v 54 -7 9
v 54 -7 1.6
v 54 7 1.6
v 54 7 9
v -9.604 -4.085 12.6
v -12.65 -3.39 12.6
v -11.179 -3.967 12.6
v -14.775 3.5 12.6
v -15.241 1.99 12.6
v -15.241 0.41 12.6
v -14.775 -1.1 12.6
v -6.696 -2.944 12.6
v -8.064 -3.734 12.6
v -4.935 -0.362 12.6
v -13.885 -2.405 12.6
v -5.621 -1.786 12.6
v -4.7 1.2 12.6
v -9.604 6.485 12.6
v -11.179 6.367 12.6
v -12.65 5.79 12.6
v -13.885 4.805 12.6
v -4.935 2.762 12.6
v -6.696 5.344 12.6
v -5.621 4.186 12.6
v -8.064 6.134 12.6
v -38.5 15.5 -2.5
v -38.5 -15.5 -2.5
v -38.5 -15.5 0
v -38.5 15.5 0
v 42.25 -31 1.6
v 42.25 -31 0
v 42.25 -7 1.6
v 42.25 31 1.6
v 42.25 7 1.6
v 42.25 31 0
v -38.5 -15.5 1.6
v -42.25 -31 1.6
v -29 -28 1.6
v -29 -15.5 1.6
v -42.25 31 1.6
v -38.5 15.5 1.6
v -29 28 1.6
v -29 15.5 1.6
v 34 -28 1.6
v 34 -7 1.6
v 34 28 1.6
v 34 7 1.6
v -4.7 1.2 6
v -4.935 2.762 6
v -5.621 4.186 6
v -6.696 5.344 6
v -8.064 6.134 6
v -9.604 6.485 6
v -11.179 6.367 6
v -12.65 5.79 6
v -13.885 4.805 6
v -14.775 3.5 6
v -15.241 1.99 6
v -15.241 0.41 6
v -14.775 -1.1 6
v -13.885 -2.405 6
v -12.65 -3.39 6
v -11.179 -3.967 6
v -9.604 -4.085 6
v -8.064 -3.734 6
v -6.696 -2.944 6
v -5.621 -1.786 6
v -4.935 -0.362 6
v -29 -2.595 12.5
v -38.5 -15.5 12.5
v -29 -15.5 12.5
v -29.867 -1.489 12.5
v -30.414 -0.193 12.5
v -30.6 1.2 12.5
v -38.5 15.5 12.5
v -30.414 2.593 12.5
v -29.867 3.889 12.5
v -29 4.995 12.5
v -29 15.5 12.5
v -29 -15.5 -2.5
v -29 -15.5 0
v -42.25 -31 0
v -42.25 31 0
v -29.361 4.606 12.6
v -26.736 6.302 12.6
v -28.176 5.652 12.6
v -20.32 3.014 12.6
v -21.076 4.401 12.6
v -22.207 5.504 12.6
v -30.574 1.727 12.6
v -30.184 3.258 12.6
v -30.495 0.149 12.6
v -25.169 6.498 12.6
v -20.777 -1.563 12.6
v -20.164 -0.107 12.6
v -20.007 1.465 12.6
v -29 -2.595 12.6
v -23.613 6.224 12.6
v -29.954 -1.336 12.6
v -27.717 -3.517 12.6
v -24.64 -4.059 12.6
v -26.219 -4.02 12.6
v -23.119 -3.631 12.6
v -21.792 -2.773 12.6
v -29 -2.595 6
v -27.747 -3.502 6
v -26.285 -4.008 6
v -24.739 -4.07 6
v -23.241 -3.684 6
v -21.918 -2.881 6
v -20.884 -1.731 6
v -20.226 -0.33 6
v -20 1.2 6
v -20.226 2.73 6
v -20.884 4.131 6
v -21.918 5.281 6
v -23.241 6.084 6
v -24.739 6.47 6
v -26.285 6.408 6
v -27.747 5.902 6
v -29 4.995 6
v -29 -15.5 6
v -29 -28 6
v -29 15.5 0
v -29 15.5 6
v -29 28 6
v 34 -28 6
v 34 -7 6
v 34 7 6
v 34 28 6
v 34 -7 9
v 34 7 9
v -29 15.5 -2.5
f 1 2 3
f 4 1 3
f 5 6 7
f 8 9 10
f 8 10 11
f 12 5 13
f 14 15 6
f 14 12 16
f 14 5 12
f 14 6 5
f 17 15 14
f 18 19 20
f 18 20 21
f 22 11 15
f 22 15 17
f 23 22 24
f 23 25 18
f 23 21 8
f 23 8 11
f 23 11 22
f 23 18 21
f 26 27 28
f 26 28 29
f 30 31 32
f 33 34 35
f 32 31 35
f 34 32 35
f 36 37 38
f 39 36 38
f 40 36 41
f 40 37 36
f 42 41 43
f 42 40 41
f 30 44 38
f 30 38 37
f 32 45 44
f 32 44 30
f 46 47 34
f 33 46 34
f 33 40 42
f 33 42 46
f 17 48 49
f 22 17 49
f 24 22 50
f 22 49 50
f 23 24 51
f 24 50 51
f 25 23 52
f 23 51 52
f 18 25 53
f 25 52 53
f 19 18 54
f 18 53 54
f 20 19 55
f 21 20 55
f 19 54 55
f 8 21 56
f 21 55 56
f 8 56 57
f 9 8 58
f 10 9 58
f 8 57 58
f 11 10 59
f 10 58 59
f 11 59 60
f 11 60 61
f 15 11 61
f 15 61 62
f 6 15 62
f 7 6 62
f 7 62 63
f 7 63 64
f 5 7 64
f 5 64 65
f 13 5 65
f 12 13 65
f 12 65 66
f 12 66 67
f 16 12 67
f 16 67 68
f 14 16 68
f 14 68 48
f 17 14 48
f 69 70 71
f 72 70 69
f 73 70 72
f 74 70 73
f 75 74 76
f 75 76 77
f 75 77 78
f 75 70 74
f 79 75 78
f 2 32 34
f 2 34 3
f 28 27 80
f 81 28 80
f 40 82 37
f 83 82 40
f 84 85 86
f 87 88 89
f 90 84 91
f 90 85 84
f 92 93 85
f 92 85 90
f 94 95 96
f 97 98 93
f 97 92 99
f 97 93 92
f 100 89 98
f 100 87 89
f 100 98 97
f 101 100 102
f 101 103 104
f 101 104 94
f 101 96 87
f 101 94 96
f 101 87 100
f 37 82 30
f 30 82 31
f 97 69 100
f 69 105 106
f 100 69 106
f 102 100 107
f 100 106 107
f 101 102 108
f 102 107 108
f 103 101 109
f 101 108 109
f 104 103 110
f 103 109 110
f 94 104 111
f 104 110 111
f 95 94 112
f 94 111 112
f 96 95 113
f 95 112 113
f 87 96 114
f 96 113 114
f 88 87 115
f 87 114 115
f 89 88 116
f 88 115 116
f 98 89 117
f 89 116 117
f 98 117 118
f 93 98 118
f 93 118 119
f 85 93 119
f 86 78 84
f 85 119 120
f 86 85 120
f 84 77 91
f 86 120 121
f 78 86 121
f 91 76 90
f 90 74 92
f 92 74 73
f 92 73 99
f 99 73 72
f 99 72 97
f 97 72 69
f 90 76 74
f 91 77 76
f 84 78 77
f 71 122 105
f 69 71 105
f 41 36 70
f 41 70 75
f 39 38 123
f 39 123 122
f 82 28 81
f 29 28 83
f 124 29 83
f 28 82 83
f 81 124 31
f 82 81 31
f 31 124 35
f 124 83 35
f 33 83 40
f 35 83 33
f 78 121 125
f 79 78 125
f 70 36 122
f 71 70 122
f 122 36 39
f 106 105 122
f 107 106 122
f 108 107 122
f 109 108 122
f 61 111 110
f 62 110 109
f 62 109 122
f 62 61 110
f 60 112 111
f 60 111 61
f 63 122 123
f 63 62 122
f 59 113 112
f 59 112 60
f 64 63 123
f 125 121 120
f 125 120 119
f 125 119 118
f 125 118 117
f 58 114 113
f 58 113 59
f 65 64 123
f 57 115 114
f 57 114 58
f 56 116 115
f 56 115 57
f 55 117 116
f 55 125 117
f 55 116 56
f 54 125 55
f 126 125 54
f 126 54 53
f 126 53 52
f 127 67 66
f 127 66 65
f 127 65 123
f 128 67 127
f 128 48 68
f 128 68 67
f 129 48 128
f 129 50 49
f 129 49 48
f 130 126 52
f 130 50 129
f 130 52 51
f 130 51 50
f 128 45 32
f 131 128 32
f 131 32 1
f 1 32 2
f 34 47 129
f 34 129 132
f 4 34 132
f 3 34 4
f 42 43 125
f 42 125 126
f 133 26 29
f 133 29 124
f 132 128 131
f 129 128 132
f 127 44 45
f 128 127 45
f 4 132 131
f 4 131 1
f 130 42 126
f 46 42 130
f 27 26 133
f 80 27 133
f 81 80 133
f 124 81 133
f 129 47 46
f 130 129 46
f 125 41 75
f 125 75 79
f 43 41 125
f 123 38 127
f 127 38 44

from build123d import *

# Parameters (mm, degrees)
SKETCH1_W             = 84.5
SKETCH1_H             = 62
PCB_DEPTH             = 1.6
SKETCH2_W             = 9.5
SKETCH2_H             = 31
TERMINAL_BLOCK_DEPTH  = 10.9
SKETCH3_W             = 9.5
SKETCH3_H             = 31
TERMINAL_PINS_DEPTH   = 2.5
SKETCH4_W             = 63
SKETCH4_H             = 56
COMPONENTS_DEPTH      = 4.4
SKETCH5_W             = 20
SKETCH5_H             = 14
INPUT_CONNECTOR_DEPTH = 7.4
SKETCH6_R             = 5.3
CAP_1_DEPTH           = 11
SKETCH7_R             = 5.3
CAP_2_DEPTH           = 11


with BuildPart() as part:
    # Sketch1 → PCB (new body)
    with BuildSketch(Plane.XY):
        Rectangle(SKETCH1_W, SKETCH1_H)
    extrude(amount=PCB_DEPTH)

    # Sketch2 → Terminal_block (add)
    with BuildSketch(Plane.XY.offset(1.6)):
        with Locations((-33.75, 0)):
            Rectangle(SKETCH2_W, SKETCH2_H)
    extrude(amount=TERMINAL_BLOCK_DEPTH)

    # Sketch3 → Terminal_pins (add)
    with BuildSketch(Plane.XY.offset(-2.5)):
        with Locations((-33.75, 0)):
            Rectangle(SKETCH3_W, SKETCH3_H)
    extrude(amount=TERMINAL_PINS_DEPTH)

    # Sketch4 → Components (add)
    with BuildSketch(Plane.XY.offset(1.6)):
        with Locations((2.5, 0)):
            Rectangle(SKETCH4_W, SKETCH4_H)
    extrude(amount=COMPONENTS_DEPTH)

    # Sketch5 → Input_connector (add)
    with BuildSketch(Plane.XY.offset(1.6)):
        with Locations((44, 0)):
            Rectangle(SKETCH5_W, SKETCH5_H)
    extrude(amount=INPUT_CONNECTOR_DEPTH)

    # Sketch6 → Cap_1 (add)
    with BuildSketch(Plane.XY.offset(1.6)):
        with Locations(Location((-25.3, 1.2, 0), (0, 0, 225.724178288))):
            Circle(SKETCH6_R)
    extrude(amount=CAP_1_DEPTH)

    # Sketch7 → Cap_2 (add)
    with BuildSketch(Plane.XY.offset(1.6)):
        with Locations((-10, 1.2)):
            Circle(SKETCH7_R)
    extrude(amount=CAP_2_DEPTH)


solid = part.part
